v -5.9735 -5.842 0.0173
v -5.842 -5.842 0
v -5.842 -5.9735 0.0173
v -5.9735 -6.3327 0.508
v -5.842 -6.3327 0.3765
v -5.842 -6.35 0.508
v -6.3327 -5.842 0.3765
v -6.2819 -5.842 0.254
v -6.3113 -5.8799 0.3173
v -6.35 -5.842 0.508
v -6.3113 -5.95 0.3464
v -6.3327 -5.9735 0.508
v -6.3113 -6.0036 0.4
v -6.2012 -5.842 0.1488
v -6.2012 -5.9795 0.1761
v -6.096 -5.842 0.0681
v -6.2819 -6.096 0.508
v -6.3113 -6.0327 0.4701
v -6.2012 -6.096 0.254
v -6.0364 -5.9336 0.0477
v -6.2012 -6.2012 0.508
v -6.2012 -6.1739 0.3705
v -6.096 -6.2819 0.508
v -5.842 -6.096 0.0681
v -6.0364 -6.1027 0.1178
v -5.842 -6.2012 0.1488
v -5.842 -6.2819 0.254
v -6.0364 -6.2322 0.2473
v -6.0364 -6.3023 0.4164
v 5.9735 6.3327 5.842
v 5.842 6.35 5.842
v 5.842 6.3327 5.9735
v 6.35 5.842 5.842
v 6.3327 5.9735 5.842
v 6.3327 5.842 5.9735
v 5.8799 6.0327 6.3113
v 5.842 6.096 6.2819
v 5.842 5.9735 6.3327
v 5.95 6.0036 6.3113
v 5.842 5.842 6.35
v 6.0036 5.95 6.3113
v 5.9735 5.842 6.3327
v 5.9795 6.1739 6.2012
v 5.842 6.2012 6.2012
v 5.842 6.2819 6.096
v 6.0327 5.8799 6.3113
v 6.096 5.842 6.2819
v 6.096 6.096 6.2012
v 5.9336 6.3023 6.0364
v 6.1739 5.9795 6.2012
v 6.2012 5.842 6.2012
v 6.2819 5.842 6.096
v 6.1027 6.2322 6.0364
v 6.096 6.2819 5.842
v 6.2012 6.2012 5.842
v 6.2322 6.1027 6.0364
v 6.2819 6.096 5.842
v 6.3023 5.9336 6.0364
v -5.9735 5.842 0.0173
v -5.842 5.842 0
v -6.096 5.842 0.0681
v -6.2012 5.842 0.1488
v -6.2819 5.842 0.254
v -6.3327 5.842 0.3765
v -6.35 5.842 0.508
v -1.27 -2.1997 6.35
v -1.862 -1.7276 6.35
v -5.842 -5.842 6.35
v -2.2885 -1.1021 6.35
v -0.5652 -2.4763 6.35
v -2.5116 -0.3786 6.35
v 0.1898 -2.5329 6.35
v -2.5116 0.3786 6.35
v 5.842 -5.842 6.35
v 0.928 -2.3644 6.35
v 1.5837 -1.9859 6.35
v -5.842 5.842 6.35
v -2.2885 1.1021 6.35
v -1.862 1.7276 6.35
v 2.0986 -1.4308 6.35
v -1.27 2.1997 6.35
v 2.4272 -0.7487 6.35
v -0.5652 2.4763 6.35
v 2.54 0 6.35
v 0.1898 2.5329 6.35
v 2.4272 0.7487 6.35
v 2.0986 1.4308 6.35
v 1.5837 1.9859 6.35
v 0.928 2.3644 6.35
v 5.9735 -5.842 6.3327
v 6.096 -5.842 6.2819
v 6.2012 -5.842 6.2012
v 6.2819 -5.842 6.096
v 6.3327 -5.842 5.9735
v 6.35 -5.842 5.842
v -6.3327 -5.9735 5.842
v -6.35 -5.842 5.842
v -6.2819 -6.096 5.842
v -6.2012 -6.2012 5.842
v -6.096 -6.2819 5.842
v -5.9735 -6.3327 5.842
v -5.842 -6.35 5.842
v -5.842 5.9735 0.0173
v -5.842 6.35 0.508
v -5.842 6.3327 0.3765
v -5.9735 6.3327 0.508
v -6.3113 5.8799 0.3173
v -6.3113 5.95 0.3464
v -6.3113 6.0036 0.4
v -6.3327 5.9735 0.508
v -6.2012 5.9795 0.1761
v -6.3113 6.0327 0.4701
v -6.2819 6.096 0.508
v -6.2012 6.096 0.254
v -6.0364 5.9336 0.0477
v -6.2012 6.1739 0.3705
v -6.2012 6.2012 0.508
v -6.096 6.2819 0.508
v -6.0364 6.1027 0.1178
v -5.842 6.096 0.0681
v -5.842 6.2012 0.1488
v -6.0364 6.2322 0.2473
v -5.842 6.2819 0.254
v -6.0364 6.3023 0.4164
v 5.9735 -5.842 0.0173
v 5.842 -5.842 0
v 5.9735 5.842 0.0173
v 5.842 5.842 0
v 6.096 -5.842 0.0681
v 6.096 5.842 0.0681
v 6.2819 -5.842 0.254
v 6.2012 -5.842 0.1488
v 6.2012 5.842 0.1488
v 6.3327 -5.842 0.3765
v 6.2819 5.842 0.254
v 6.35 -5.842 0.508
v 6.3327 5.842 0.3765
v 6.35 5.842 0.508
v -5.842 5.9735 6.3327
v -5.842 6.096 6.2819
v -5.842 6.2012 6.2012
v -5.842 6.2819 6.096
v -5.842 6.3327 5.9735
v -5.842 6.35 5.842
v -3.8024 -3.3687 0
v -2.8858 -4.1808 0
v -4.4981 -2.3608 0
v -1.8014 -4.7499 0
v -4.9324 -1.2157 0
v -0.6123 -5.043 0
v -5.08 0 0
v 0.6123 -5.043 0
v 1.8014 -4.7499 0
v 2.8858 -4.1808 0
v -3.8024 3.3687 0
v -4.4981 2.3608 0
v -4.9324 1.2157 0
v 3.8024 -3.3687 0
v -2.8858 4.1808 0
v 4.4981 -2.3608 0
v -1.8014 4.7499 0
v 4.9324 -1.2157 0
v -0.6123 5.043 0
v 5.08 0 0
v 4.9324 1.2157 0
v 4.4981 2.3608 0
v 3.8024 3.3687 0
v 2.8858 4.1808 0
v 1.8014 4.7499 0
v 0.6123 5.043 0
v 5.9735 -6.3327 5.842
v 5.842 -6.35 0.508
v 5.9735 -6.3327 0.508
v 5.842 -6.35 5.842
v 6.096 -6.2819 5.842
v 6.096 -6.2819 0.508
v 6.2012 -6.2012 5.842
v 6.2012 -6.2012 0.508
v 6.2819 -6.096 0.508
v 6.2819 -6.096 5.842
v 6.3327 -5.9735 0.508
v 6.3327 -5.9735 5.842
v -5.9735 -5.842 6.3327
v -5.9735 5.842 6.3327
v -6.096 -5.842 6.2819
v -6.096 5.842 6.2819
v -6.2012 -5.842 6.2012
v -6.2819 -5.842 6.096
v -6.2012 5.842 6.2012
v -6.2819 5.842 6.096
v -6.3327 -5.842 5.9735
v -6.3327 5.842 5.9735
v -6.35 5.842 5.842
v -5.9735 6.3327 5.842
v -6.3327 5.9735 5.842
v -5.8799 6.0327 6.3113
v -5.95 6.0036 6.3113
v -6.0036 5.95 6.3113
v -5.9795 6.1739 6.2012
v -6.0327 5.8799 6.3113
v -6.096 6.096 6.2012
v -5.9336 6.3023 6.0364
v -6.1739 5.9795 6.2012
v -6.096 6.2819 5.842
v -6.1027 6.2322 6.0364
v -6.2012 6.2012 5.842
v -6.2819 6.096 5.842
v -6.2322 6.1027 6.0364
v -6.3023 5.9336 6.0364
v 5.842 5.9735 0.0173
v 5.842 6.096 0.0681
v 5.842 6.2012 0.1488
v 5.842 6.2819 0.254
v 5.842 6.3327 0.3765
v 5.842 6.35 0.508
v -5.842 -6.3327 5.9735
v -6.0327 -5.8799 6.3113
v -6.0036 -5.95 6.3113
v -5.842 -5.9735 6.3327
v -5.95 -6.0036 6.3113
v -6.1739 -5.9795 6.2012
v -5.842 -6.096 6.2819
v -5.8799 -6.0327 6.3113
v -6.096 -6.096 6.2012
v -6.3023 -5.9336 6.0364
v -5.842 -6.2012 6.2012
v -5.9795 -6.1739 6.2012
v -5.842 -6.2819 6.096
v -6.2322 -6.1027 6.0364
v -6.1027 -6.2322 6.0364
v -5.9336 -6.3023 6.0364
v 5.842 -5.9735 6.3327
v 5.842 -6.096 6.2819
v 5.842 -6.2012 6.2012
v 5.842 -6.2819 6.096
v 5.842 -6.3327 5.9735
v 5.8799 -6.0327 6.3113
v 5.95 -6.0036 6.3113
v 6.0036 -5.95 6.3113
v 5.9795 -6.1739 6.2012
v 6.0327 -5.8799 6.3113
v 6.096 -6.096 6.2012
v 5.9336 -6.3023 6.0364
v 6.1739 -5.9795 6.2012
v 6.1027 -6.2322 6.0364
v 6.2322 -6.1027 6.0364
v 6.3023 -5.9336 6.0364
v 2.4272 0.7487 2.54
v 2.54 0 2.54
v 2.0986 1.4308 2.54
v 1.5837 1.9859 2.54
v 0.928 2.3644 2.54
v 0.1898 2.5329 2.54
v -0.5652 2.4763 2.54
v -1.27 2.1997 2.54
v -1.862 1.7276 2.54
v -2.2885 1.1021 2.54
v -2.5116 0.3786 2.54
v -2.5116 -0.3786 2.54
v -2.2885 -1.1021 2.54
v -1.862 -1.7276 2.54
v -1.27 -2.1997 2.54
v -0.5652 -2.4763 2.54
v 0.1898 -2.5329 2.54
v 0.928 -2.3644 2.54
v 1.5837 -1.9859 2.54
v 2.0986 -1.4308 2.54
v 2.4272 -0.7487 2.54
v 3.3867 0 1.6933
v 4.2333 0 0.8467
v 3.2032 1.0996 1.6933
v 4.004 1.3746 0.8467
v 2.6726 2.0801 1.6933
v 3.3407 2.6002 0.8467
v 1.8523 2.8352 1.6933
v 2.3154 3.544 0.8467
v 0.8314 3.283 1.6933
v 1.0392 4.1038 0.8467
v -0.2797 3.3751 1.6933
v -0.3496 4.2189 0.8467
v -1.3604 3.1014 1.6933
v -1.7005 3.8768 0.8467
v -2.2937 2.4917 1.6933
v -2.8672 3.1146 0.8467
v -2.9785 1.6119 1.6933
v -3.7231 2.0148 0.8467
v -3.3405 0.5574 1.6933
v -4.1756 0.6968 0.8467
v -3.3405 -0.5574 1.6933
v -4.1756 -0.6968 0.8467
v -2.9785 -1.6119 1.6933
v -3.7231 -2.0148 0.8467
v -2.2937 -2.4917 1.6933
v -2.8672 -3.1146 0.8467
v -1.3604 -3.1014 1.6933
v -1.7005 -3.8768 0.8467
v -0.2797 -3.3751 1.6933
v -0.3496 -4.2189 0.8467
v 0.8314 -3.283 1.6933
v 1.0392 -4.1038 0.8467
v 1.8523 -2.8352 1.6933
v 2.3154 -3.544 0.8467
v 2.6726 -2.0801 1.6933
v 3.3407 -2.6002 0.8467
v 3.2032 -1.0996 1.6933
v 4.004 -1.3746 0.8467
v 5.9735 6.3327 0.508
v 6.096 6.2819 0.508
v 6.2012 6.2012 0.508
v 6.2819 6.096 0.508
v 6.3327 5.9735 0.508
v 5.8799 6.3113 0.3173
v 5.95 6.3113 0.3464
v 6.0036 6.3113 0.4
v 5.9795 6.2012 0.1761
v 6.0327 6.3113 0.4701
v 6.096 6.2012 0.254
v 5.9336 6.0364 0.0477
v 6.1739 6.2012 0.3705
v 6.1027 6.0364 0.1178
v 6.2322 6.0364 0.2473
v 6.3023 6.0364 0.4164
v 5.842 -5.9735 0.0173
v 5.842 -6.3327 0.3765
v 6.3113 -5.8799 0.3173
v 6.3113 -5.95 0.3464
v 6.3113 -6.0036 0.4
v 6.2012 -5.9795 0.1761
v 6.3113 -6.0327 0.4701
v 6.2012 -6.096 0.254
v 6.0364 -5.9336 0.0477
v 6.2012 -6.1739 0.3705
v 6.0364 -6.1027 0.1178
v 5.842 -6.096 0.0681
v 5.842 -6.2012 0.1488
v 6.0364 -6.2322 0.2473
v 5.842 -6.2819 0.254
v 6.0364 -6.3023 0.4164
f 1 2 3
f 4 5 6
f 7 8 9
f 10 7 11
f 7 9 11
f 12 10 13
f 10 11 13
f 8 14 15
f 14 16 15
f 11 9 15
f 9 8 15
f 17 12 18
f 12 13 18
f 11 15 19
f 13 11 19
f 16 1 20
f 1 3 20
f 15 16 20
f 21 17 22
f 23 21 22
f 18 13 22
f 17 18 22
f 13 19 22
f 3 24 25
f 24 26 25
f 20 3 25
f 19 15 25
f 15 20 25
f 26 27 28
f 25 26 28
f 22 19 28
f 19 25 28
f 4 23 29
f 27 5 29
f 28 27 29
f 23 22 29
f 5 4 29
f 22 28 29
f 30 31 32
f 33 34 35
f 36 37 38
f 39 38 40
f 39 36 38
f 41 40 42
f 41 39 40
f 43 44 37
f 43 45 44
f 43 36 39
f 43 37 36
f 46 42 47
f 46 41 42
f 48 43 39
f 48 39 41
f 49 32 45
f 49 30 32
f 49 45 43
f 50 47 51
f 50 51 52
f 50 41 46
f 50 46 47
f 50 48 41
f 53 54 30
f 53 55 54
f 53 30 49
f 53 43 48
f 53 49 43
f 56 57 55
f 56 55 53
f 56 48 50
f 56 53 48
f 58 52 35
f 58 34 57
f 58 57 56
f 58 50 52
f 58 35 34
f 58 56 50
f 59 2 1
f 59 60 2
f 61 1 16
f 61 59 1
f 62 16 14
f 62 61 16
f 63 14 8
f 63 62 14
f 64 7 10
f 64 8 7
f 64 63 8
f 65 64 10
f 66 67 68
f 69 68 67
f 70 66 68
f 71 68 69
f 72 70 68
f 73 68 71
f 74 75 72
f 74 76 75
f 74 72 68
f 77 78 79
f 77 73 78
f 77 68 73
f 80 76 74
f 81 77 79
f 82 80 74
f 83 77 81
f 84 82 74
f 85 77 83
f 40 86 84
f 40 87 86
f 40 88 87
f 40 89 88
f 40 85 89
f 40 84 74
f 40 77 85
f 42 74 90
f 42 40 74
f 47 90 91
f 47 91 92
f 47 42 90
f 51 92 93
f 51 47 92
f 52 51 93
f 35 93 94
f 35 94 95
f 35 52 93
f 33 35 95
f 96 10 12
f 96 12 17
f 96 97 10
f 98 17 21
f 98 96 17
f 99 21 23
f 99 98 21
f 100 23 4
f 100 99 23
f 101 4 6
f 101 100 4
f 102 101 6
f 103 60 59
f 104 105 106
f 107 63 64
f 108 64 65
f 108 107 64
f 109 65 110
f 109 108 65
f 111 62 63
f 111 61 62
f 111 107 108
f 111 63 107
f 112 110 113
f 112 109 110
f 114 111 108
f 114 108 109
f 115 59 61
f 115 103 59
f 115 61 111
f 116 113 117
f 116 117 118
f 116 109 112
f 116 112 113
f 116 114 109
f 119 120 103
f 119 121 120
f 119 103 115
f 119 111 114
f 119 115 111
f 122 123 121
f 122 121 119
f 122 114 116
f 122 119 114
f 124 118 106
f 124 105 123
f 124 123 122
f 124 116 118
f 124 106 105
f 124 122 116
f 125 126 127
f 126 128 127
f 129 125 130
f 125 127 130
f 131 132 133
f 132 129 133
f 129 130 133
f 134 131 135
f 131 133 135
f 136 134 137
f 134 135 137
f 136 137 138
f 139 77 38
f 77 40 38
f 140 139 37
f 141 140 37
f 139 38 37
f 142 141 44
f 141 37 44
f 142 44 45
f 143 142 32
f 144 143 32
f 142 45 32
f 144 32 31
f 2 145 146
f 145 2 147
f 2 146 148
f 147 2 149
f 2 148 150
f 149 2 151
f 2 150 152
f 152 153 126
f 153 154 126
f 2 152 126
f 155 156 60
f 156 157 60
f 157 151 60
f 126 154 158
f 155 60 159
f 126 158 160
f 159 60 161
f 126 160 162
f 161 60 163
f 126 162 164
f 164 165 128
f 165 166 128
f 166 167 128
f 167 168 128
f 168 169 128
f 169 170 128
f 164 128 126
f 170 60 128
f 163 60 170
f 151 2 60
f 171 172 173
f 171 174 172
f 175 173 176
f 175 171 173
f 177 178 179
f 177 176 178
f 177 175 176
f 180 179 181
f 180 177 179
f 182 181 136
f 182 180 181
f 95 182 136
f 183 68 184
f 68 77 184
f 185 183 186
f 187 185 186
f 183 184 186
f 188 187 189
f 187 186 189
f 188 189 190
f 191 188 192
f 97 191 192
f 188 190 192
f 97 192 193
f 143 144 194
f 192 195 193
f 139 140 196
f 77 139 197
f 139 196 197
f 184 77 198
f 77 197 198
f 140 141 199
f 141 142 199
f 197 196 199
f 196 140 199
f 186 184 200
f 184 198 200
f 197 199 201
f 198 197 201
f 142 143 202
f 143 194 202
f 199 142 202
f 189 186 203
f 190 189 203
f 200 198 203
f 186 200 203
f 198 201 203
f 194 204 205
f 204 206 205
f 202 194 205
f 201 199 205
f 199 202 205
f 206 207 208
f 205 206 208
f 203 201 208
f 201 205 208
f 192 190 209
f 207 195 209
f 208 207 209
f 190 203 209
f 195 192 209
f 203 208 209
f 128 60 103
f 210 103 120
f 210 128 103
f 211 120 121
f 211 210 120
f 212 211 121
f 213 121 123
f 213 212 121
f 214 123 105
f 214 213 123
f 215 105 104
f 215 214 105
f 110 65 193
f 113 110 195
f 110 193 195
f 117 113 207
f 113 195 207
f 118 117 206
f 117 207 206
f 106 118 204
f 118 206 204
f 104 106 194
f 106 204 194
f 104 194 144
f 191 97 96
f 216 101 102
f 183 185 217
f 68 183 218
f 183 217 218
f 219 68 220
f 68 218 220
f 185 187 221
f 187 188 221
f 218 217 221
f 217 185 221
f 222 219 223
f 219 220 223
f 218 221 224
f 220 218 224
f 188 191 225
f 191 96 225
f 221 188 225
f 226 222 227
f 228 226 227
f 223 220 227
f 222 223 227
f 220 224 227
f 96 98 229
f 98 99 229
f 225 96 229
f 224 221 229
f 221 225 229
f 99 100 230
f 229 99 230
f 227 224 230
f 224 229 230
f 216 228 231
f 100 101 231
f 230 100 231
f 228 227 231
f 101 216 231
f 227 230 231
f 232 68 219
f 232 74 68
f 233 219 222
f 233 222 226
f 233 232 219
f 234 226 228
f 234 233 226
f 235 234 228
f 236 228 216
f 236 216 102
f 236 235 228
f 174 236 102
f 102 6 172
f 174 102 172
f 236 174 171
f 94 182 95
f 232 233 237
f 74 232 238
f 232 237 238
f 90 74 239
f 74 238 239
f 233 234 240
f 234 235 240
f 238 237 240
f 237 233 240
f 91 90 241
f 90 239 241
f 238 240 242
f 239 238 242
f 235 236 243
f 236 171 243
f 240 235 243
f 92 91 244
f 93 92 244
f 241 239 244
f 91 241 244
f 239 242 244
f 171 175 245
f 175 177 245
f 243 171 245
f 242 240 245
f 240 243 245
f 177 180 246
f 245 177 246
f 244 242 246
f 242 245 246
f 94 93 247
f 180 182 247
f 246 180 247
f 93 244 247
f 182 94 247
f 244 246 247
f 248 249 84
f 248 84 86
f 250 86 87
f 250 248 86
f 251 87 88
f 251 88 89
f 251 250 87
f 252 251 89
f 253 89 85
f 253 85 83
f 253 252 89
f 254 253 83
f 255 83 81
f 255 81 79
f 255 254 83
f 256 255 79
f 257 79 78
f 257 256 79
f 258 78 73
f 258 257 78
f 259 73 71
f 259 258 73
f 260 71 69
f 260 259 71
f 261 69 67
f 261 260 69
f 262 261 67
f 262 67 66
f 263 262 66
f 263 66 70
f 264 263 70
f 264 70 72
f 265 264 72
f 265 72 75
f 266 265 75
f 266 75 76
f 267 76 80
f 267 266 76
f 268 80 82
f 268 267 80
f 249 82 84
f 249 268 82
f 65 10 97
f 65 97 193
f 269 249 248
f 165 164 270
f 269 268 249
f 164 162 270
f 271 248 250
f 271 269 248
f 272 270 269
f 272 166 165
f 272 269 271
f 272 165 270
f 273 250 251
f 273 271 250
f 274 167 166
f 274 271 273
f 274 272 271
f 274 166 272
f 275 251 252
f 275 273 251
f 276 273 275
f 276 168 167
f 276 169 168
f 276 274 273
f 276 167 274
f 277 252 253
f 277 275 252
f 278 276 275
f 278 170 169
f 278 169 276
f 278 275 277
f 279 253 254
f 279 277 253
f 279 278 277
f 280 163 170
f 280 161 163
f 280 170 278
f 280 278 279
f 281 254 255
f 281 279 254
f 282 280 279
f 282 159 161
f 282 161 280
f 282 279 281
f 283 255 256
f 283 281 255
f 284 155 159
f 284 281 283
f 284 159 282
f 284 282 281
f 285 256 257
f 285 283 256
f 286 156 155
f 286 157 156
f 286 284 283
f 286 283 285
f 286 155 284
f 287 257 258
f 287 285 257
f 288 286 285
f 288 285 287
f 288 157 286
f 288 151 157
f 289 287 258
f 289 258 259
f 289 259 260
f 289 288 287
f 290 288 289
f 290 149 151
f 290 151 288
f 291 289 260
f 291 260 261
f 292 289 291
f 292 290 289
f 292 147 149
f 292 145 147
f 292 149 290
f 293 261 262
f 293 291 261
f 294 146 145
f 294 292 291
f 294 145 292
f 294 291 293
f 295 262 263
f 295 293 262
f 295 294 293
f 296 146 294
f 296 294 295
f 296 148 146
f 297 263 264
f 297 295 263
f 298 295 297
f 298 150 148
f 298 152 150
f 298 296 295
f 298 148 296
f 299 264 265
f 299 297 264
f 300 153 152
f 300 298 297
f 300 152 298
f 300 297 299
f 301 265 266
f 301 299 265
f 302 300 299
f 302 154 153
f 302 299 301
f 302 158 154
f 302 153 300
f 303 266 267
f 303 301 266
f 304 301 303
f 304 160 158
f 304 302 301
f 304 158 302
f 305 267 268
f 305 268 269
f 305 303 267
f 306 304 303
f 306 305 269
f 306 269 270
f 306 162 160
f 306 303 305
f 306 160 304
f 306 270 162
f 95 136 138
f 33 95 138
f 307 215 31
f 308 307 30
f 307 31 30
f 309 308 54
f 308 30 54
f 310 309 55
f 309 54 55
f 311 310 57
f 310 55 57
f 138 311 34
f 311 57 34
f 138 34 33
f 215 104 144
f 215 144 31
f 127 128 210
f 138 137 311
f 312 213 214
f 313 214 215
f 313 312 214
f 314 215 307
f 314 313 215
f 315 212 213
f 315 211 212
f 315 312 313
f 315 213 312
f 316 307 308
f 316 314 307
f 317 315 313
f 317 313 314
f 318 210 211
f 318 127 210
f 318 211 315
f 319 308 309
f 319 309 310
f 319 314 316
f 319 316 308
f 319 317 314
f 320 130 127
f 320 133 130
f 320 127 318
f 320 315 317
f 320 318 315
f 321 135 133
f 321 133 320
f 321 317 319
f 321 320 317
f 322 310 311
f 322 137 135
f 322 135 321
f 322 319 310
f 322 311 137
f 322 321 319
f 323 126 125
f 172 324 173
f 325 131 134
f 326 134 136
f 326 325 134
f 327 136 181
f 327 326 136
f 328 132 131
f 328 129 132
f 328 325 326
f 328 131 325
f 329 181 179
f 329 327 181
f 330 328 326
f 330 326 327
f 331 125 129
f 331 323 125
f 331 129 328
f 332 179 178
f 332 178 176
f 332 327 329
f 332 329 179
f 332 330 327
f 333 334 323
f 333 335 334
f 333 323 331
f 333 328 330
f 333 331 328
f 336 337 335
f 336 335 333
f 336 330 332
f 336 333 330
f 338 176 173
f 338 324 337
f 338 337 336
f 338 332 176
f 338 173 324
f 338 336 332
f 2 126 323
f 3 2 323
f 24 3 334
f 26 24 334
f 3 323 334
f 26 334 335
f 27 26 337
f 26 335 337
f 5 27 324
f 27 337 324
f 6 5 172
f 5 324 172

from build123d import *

# Parameters (mm, degrees)
F0_W     = 12.7
F0_H     = 12.7
F0_R     = 2.54
F1_DEPTH = 6.35
F2_SIZE  = 2.54
F3_R     = 0.508


with BuildPart() as f1:
    # F0 (on Top) → F1 (new body)
    with BuildSketch(Plane.XY):
        Rectangle(F0_W, F0_H)
        Circle(F0_R, mode=Mode.SUBTRACT)
    extrude(amount=F1_DEPTH)

    # F2
    f2_edges = [f1.edges().sort_by_distance(p)[0] for p in [
        (-2.54, 0, 0),
    ]]
    chamfer(f2_edges, length=F2_SIZE)

    # F3
    f3_edges = [f1.edges().sort_by_distance(p)[0] for p in [
        (0, -6.35, 0),
        (6.35, 0, 0),
        (0, 6.35, 0),
        (-6.35, 0, 0),
        (-6.35, -6.35, 3.175),
        (6.35, -6.35, 3.175),
        (6.35, 6.35, 3.175),
        (-6.35, 6.35, 3.175),
        (0, 6.35, 6.35),
        (-6.35, 0, 6.35),
        (0, -6.35, 6.35),
        (6.35, 0, 6.35),
    ]]
    fillet(f3_edges, radius=F3_R)


solid = f1.part
